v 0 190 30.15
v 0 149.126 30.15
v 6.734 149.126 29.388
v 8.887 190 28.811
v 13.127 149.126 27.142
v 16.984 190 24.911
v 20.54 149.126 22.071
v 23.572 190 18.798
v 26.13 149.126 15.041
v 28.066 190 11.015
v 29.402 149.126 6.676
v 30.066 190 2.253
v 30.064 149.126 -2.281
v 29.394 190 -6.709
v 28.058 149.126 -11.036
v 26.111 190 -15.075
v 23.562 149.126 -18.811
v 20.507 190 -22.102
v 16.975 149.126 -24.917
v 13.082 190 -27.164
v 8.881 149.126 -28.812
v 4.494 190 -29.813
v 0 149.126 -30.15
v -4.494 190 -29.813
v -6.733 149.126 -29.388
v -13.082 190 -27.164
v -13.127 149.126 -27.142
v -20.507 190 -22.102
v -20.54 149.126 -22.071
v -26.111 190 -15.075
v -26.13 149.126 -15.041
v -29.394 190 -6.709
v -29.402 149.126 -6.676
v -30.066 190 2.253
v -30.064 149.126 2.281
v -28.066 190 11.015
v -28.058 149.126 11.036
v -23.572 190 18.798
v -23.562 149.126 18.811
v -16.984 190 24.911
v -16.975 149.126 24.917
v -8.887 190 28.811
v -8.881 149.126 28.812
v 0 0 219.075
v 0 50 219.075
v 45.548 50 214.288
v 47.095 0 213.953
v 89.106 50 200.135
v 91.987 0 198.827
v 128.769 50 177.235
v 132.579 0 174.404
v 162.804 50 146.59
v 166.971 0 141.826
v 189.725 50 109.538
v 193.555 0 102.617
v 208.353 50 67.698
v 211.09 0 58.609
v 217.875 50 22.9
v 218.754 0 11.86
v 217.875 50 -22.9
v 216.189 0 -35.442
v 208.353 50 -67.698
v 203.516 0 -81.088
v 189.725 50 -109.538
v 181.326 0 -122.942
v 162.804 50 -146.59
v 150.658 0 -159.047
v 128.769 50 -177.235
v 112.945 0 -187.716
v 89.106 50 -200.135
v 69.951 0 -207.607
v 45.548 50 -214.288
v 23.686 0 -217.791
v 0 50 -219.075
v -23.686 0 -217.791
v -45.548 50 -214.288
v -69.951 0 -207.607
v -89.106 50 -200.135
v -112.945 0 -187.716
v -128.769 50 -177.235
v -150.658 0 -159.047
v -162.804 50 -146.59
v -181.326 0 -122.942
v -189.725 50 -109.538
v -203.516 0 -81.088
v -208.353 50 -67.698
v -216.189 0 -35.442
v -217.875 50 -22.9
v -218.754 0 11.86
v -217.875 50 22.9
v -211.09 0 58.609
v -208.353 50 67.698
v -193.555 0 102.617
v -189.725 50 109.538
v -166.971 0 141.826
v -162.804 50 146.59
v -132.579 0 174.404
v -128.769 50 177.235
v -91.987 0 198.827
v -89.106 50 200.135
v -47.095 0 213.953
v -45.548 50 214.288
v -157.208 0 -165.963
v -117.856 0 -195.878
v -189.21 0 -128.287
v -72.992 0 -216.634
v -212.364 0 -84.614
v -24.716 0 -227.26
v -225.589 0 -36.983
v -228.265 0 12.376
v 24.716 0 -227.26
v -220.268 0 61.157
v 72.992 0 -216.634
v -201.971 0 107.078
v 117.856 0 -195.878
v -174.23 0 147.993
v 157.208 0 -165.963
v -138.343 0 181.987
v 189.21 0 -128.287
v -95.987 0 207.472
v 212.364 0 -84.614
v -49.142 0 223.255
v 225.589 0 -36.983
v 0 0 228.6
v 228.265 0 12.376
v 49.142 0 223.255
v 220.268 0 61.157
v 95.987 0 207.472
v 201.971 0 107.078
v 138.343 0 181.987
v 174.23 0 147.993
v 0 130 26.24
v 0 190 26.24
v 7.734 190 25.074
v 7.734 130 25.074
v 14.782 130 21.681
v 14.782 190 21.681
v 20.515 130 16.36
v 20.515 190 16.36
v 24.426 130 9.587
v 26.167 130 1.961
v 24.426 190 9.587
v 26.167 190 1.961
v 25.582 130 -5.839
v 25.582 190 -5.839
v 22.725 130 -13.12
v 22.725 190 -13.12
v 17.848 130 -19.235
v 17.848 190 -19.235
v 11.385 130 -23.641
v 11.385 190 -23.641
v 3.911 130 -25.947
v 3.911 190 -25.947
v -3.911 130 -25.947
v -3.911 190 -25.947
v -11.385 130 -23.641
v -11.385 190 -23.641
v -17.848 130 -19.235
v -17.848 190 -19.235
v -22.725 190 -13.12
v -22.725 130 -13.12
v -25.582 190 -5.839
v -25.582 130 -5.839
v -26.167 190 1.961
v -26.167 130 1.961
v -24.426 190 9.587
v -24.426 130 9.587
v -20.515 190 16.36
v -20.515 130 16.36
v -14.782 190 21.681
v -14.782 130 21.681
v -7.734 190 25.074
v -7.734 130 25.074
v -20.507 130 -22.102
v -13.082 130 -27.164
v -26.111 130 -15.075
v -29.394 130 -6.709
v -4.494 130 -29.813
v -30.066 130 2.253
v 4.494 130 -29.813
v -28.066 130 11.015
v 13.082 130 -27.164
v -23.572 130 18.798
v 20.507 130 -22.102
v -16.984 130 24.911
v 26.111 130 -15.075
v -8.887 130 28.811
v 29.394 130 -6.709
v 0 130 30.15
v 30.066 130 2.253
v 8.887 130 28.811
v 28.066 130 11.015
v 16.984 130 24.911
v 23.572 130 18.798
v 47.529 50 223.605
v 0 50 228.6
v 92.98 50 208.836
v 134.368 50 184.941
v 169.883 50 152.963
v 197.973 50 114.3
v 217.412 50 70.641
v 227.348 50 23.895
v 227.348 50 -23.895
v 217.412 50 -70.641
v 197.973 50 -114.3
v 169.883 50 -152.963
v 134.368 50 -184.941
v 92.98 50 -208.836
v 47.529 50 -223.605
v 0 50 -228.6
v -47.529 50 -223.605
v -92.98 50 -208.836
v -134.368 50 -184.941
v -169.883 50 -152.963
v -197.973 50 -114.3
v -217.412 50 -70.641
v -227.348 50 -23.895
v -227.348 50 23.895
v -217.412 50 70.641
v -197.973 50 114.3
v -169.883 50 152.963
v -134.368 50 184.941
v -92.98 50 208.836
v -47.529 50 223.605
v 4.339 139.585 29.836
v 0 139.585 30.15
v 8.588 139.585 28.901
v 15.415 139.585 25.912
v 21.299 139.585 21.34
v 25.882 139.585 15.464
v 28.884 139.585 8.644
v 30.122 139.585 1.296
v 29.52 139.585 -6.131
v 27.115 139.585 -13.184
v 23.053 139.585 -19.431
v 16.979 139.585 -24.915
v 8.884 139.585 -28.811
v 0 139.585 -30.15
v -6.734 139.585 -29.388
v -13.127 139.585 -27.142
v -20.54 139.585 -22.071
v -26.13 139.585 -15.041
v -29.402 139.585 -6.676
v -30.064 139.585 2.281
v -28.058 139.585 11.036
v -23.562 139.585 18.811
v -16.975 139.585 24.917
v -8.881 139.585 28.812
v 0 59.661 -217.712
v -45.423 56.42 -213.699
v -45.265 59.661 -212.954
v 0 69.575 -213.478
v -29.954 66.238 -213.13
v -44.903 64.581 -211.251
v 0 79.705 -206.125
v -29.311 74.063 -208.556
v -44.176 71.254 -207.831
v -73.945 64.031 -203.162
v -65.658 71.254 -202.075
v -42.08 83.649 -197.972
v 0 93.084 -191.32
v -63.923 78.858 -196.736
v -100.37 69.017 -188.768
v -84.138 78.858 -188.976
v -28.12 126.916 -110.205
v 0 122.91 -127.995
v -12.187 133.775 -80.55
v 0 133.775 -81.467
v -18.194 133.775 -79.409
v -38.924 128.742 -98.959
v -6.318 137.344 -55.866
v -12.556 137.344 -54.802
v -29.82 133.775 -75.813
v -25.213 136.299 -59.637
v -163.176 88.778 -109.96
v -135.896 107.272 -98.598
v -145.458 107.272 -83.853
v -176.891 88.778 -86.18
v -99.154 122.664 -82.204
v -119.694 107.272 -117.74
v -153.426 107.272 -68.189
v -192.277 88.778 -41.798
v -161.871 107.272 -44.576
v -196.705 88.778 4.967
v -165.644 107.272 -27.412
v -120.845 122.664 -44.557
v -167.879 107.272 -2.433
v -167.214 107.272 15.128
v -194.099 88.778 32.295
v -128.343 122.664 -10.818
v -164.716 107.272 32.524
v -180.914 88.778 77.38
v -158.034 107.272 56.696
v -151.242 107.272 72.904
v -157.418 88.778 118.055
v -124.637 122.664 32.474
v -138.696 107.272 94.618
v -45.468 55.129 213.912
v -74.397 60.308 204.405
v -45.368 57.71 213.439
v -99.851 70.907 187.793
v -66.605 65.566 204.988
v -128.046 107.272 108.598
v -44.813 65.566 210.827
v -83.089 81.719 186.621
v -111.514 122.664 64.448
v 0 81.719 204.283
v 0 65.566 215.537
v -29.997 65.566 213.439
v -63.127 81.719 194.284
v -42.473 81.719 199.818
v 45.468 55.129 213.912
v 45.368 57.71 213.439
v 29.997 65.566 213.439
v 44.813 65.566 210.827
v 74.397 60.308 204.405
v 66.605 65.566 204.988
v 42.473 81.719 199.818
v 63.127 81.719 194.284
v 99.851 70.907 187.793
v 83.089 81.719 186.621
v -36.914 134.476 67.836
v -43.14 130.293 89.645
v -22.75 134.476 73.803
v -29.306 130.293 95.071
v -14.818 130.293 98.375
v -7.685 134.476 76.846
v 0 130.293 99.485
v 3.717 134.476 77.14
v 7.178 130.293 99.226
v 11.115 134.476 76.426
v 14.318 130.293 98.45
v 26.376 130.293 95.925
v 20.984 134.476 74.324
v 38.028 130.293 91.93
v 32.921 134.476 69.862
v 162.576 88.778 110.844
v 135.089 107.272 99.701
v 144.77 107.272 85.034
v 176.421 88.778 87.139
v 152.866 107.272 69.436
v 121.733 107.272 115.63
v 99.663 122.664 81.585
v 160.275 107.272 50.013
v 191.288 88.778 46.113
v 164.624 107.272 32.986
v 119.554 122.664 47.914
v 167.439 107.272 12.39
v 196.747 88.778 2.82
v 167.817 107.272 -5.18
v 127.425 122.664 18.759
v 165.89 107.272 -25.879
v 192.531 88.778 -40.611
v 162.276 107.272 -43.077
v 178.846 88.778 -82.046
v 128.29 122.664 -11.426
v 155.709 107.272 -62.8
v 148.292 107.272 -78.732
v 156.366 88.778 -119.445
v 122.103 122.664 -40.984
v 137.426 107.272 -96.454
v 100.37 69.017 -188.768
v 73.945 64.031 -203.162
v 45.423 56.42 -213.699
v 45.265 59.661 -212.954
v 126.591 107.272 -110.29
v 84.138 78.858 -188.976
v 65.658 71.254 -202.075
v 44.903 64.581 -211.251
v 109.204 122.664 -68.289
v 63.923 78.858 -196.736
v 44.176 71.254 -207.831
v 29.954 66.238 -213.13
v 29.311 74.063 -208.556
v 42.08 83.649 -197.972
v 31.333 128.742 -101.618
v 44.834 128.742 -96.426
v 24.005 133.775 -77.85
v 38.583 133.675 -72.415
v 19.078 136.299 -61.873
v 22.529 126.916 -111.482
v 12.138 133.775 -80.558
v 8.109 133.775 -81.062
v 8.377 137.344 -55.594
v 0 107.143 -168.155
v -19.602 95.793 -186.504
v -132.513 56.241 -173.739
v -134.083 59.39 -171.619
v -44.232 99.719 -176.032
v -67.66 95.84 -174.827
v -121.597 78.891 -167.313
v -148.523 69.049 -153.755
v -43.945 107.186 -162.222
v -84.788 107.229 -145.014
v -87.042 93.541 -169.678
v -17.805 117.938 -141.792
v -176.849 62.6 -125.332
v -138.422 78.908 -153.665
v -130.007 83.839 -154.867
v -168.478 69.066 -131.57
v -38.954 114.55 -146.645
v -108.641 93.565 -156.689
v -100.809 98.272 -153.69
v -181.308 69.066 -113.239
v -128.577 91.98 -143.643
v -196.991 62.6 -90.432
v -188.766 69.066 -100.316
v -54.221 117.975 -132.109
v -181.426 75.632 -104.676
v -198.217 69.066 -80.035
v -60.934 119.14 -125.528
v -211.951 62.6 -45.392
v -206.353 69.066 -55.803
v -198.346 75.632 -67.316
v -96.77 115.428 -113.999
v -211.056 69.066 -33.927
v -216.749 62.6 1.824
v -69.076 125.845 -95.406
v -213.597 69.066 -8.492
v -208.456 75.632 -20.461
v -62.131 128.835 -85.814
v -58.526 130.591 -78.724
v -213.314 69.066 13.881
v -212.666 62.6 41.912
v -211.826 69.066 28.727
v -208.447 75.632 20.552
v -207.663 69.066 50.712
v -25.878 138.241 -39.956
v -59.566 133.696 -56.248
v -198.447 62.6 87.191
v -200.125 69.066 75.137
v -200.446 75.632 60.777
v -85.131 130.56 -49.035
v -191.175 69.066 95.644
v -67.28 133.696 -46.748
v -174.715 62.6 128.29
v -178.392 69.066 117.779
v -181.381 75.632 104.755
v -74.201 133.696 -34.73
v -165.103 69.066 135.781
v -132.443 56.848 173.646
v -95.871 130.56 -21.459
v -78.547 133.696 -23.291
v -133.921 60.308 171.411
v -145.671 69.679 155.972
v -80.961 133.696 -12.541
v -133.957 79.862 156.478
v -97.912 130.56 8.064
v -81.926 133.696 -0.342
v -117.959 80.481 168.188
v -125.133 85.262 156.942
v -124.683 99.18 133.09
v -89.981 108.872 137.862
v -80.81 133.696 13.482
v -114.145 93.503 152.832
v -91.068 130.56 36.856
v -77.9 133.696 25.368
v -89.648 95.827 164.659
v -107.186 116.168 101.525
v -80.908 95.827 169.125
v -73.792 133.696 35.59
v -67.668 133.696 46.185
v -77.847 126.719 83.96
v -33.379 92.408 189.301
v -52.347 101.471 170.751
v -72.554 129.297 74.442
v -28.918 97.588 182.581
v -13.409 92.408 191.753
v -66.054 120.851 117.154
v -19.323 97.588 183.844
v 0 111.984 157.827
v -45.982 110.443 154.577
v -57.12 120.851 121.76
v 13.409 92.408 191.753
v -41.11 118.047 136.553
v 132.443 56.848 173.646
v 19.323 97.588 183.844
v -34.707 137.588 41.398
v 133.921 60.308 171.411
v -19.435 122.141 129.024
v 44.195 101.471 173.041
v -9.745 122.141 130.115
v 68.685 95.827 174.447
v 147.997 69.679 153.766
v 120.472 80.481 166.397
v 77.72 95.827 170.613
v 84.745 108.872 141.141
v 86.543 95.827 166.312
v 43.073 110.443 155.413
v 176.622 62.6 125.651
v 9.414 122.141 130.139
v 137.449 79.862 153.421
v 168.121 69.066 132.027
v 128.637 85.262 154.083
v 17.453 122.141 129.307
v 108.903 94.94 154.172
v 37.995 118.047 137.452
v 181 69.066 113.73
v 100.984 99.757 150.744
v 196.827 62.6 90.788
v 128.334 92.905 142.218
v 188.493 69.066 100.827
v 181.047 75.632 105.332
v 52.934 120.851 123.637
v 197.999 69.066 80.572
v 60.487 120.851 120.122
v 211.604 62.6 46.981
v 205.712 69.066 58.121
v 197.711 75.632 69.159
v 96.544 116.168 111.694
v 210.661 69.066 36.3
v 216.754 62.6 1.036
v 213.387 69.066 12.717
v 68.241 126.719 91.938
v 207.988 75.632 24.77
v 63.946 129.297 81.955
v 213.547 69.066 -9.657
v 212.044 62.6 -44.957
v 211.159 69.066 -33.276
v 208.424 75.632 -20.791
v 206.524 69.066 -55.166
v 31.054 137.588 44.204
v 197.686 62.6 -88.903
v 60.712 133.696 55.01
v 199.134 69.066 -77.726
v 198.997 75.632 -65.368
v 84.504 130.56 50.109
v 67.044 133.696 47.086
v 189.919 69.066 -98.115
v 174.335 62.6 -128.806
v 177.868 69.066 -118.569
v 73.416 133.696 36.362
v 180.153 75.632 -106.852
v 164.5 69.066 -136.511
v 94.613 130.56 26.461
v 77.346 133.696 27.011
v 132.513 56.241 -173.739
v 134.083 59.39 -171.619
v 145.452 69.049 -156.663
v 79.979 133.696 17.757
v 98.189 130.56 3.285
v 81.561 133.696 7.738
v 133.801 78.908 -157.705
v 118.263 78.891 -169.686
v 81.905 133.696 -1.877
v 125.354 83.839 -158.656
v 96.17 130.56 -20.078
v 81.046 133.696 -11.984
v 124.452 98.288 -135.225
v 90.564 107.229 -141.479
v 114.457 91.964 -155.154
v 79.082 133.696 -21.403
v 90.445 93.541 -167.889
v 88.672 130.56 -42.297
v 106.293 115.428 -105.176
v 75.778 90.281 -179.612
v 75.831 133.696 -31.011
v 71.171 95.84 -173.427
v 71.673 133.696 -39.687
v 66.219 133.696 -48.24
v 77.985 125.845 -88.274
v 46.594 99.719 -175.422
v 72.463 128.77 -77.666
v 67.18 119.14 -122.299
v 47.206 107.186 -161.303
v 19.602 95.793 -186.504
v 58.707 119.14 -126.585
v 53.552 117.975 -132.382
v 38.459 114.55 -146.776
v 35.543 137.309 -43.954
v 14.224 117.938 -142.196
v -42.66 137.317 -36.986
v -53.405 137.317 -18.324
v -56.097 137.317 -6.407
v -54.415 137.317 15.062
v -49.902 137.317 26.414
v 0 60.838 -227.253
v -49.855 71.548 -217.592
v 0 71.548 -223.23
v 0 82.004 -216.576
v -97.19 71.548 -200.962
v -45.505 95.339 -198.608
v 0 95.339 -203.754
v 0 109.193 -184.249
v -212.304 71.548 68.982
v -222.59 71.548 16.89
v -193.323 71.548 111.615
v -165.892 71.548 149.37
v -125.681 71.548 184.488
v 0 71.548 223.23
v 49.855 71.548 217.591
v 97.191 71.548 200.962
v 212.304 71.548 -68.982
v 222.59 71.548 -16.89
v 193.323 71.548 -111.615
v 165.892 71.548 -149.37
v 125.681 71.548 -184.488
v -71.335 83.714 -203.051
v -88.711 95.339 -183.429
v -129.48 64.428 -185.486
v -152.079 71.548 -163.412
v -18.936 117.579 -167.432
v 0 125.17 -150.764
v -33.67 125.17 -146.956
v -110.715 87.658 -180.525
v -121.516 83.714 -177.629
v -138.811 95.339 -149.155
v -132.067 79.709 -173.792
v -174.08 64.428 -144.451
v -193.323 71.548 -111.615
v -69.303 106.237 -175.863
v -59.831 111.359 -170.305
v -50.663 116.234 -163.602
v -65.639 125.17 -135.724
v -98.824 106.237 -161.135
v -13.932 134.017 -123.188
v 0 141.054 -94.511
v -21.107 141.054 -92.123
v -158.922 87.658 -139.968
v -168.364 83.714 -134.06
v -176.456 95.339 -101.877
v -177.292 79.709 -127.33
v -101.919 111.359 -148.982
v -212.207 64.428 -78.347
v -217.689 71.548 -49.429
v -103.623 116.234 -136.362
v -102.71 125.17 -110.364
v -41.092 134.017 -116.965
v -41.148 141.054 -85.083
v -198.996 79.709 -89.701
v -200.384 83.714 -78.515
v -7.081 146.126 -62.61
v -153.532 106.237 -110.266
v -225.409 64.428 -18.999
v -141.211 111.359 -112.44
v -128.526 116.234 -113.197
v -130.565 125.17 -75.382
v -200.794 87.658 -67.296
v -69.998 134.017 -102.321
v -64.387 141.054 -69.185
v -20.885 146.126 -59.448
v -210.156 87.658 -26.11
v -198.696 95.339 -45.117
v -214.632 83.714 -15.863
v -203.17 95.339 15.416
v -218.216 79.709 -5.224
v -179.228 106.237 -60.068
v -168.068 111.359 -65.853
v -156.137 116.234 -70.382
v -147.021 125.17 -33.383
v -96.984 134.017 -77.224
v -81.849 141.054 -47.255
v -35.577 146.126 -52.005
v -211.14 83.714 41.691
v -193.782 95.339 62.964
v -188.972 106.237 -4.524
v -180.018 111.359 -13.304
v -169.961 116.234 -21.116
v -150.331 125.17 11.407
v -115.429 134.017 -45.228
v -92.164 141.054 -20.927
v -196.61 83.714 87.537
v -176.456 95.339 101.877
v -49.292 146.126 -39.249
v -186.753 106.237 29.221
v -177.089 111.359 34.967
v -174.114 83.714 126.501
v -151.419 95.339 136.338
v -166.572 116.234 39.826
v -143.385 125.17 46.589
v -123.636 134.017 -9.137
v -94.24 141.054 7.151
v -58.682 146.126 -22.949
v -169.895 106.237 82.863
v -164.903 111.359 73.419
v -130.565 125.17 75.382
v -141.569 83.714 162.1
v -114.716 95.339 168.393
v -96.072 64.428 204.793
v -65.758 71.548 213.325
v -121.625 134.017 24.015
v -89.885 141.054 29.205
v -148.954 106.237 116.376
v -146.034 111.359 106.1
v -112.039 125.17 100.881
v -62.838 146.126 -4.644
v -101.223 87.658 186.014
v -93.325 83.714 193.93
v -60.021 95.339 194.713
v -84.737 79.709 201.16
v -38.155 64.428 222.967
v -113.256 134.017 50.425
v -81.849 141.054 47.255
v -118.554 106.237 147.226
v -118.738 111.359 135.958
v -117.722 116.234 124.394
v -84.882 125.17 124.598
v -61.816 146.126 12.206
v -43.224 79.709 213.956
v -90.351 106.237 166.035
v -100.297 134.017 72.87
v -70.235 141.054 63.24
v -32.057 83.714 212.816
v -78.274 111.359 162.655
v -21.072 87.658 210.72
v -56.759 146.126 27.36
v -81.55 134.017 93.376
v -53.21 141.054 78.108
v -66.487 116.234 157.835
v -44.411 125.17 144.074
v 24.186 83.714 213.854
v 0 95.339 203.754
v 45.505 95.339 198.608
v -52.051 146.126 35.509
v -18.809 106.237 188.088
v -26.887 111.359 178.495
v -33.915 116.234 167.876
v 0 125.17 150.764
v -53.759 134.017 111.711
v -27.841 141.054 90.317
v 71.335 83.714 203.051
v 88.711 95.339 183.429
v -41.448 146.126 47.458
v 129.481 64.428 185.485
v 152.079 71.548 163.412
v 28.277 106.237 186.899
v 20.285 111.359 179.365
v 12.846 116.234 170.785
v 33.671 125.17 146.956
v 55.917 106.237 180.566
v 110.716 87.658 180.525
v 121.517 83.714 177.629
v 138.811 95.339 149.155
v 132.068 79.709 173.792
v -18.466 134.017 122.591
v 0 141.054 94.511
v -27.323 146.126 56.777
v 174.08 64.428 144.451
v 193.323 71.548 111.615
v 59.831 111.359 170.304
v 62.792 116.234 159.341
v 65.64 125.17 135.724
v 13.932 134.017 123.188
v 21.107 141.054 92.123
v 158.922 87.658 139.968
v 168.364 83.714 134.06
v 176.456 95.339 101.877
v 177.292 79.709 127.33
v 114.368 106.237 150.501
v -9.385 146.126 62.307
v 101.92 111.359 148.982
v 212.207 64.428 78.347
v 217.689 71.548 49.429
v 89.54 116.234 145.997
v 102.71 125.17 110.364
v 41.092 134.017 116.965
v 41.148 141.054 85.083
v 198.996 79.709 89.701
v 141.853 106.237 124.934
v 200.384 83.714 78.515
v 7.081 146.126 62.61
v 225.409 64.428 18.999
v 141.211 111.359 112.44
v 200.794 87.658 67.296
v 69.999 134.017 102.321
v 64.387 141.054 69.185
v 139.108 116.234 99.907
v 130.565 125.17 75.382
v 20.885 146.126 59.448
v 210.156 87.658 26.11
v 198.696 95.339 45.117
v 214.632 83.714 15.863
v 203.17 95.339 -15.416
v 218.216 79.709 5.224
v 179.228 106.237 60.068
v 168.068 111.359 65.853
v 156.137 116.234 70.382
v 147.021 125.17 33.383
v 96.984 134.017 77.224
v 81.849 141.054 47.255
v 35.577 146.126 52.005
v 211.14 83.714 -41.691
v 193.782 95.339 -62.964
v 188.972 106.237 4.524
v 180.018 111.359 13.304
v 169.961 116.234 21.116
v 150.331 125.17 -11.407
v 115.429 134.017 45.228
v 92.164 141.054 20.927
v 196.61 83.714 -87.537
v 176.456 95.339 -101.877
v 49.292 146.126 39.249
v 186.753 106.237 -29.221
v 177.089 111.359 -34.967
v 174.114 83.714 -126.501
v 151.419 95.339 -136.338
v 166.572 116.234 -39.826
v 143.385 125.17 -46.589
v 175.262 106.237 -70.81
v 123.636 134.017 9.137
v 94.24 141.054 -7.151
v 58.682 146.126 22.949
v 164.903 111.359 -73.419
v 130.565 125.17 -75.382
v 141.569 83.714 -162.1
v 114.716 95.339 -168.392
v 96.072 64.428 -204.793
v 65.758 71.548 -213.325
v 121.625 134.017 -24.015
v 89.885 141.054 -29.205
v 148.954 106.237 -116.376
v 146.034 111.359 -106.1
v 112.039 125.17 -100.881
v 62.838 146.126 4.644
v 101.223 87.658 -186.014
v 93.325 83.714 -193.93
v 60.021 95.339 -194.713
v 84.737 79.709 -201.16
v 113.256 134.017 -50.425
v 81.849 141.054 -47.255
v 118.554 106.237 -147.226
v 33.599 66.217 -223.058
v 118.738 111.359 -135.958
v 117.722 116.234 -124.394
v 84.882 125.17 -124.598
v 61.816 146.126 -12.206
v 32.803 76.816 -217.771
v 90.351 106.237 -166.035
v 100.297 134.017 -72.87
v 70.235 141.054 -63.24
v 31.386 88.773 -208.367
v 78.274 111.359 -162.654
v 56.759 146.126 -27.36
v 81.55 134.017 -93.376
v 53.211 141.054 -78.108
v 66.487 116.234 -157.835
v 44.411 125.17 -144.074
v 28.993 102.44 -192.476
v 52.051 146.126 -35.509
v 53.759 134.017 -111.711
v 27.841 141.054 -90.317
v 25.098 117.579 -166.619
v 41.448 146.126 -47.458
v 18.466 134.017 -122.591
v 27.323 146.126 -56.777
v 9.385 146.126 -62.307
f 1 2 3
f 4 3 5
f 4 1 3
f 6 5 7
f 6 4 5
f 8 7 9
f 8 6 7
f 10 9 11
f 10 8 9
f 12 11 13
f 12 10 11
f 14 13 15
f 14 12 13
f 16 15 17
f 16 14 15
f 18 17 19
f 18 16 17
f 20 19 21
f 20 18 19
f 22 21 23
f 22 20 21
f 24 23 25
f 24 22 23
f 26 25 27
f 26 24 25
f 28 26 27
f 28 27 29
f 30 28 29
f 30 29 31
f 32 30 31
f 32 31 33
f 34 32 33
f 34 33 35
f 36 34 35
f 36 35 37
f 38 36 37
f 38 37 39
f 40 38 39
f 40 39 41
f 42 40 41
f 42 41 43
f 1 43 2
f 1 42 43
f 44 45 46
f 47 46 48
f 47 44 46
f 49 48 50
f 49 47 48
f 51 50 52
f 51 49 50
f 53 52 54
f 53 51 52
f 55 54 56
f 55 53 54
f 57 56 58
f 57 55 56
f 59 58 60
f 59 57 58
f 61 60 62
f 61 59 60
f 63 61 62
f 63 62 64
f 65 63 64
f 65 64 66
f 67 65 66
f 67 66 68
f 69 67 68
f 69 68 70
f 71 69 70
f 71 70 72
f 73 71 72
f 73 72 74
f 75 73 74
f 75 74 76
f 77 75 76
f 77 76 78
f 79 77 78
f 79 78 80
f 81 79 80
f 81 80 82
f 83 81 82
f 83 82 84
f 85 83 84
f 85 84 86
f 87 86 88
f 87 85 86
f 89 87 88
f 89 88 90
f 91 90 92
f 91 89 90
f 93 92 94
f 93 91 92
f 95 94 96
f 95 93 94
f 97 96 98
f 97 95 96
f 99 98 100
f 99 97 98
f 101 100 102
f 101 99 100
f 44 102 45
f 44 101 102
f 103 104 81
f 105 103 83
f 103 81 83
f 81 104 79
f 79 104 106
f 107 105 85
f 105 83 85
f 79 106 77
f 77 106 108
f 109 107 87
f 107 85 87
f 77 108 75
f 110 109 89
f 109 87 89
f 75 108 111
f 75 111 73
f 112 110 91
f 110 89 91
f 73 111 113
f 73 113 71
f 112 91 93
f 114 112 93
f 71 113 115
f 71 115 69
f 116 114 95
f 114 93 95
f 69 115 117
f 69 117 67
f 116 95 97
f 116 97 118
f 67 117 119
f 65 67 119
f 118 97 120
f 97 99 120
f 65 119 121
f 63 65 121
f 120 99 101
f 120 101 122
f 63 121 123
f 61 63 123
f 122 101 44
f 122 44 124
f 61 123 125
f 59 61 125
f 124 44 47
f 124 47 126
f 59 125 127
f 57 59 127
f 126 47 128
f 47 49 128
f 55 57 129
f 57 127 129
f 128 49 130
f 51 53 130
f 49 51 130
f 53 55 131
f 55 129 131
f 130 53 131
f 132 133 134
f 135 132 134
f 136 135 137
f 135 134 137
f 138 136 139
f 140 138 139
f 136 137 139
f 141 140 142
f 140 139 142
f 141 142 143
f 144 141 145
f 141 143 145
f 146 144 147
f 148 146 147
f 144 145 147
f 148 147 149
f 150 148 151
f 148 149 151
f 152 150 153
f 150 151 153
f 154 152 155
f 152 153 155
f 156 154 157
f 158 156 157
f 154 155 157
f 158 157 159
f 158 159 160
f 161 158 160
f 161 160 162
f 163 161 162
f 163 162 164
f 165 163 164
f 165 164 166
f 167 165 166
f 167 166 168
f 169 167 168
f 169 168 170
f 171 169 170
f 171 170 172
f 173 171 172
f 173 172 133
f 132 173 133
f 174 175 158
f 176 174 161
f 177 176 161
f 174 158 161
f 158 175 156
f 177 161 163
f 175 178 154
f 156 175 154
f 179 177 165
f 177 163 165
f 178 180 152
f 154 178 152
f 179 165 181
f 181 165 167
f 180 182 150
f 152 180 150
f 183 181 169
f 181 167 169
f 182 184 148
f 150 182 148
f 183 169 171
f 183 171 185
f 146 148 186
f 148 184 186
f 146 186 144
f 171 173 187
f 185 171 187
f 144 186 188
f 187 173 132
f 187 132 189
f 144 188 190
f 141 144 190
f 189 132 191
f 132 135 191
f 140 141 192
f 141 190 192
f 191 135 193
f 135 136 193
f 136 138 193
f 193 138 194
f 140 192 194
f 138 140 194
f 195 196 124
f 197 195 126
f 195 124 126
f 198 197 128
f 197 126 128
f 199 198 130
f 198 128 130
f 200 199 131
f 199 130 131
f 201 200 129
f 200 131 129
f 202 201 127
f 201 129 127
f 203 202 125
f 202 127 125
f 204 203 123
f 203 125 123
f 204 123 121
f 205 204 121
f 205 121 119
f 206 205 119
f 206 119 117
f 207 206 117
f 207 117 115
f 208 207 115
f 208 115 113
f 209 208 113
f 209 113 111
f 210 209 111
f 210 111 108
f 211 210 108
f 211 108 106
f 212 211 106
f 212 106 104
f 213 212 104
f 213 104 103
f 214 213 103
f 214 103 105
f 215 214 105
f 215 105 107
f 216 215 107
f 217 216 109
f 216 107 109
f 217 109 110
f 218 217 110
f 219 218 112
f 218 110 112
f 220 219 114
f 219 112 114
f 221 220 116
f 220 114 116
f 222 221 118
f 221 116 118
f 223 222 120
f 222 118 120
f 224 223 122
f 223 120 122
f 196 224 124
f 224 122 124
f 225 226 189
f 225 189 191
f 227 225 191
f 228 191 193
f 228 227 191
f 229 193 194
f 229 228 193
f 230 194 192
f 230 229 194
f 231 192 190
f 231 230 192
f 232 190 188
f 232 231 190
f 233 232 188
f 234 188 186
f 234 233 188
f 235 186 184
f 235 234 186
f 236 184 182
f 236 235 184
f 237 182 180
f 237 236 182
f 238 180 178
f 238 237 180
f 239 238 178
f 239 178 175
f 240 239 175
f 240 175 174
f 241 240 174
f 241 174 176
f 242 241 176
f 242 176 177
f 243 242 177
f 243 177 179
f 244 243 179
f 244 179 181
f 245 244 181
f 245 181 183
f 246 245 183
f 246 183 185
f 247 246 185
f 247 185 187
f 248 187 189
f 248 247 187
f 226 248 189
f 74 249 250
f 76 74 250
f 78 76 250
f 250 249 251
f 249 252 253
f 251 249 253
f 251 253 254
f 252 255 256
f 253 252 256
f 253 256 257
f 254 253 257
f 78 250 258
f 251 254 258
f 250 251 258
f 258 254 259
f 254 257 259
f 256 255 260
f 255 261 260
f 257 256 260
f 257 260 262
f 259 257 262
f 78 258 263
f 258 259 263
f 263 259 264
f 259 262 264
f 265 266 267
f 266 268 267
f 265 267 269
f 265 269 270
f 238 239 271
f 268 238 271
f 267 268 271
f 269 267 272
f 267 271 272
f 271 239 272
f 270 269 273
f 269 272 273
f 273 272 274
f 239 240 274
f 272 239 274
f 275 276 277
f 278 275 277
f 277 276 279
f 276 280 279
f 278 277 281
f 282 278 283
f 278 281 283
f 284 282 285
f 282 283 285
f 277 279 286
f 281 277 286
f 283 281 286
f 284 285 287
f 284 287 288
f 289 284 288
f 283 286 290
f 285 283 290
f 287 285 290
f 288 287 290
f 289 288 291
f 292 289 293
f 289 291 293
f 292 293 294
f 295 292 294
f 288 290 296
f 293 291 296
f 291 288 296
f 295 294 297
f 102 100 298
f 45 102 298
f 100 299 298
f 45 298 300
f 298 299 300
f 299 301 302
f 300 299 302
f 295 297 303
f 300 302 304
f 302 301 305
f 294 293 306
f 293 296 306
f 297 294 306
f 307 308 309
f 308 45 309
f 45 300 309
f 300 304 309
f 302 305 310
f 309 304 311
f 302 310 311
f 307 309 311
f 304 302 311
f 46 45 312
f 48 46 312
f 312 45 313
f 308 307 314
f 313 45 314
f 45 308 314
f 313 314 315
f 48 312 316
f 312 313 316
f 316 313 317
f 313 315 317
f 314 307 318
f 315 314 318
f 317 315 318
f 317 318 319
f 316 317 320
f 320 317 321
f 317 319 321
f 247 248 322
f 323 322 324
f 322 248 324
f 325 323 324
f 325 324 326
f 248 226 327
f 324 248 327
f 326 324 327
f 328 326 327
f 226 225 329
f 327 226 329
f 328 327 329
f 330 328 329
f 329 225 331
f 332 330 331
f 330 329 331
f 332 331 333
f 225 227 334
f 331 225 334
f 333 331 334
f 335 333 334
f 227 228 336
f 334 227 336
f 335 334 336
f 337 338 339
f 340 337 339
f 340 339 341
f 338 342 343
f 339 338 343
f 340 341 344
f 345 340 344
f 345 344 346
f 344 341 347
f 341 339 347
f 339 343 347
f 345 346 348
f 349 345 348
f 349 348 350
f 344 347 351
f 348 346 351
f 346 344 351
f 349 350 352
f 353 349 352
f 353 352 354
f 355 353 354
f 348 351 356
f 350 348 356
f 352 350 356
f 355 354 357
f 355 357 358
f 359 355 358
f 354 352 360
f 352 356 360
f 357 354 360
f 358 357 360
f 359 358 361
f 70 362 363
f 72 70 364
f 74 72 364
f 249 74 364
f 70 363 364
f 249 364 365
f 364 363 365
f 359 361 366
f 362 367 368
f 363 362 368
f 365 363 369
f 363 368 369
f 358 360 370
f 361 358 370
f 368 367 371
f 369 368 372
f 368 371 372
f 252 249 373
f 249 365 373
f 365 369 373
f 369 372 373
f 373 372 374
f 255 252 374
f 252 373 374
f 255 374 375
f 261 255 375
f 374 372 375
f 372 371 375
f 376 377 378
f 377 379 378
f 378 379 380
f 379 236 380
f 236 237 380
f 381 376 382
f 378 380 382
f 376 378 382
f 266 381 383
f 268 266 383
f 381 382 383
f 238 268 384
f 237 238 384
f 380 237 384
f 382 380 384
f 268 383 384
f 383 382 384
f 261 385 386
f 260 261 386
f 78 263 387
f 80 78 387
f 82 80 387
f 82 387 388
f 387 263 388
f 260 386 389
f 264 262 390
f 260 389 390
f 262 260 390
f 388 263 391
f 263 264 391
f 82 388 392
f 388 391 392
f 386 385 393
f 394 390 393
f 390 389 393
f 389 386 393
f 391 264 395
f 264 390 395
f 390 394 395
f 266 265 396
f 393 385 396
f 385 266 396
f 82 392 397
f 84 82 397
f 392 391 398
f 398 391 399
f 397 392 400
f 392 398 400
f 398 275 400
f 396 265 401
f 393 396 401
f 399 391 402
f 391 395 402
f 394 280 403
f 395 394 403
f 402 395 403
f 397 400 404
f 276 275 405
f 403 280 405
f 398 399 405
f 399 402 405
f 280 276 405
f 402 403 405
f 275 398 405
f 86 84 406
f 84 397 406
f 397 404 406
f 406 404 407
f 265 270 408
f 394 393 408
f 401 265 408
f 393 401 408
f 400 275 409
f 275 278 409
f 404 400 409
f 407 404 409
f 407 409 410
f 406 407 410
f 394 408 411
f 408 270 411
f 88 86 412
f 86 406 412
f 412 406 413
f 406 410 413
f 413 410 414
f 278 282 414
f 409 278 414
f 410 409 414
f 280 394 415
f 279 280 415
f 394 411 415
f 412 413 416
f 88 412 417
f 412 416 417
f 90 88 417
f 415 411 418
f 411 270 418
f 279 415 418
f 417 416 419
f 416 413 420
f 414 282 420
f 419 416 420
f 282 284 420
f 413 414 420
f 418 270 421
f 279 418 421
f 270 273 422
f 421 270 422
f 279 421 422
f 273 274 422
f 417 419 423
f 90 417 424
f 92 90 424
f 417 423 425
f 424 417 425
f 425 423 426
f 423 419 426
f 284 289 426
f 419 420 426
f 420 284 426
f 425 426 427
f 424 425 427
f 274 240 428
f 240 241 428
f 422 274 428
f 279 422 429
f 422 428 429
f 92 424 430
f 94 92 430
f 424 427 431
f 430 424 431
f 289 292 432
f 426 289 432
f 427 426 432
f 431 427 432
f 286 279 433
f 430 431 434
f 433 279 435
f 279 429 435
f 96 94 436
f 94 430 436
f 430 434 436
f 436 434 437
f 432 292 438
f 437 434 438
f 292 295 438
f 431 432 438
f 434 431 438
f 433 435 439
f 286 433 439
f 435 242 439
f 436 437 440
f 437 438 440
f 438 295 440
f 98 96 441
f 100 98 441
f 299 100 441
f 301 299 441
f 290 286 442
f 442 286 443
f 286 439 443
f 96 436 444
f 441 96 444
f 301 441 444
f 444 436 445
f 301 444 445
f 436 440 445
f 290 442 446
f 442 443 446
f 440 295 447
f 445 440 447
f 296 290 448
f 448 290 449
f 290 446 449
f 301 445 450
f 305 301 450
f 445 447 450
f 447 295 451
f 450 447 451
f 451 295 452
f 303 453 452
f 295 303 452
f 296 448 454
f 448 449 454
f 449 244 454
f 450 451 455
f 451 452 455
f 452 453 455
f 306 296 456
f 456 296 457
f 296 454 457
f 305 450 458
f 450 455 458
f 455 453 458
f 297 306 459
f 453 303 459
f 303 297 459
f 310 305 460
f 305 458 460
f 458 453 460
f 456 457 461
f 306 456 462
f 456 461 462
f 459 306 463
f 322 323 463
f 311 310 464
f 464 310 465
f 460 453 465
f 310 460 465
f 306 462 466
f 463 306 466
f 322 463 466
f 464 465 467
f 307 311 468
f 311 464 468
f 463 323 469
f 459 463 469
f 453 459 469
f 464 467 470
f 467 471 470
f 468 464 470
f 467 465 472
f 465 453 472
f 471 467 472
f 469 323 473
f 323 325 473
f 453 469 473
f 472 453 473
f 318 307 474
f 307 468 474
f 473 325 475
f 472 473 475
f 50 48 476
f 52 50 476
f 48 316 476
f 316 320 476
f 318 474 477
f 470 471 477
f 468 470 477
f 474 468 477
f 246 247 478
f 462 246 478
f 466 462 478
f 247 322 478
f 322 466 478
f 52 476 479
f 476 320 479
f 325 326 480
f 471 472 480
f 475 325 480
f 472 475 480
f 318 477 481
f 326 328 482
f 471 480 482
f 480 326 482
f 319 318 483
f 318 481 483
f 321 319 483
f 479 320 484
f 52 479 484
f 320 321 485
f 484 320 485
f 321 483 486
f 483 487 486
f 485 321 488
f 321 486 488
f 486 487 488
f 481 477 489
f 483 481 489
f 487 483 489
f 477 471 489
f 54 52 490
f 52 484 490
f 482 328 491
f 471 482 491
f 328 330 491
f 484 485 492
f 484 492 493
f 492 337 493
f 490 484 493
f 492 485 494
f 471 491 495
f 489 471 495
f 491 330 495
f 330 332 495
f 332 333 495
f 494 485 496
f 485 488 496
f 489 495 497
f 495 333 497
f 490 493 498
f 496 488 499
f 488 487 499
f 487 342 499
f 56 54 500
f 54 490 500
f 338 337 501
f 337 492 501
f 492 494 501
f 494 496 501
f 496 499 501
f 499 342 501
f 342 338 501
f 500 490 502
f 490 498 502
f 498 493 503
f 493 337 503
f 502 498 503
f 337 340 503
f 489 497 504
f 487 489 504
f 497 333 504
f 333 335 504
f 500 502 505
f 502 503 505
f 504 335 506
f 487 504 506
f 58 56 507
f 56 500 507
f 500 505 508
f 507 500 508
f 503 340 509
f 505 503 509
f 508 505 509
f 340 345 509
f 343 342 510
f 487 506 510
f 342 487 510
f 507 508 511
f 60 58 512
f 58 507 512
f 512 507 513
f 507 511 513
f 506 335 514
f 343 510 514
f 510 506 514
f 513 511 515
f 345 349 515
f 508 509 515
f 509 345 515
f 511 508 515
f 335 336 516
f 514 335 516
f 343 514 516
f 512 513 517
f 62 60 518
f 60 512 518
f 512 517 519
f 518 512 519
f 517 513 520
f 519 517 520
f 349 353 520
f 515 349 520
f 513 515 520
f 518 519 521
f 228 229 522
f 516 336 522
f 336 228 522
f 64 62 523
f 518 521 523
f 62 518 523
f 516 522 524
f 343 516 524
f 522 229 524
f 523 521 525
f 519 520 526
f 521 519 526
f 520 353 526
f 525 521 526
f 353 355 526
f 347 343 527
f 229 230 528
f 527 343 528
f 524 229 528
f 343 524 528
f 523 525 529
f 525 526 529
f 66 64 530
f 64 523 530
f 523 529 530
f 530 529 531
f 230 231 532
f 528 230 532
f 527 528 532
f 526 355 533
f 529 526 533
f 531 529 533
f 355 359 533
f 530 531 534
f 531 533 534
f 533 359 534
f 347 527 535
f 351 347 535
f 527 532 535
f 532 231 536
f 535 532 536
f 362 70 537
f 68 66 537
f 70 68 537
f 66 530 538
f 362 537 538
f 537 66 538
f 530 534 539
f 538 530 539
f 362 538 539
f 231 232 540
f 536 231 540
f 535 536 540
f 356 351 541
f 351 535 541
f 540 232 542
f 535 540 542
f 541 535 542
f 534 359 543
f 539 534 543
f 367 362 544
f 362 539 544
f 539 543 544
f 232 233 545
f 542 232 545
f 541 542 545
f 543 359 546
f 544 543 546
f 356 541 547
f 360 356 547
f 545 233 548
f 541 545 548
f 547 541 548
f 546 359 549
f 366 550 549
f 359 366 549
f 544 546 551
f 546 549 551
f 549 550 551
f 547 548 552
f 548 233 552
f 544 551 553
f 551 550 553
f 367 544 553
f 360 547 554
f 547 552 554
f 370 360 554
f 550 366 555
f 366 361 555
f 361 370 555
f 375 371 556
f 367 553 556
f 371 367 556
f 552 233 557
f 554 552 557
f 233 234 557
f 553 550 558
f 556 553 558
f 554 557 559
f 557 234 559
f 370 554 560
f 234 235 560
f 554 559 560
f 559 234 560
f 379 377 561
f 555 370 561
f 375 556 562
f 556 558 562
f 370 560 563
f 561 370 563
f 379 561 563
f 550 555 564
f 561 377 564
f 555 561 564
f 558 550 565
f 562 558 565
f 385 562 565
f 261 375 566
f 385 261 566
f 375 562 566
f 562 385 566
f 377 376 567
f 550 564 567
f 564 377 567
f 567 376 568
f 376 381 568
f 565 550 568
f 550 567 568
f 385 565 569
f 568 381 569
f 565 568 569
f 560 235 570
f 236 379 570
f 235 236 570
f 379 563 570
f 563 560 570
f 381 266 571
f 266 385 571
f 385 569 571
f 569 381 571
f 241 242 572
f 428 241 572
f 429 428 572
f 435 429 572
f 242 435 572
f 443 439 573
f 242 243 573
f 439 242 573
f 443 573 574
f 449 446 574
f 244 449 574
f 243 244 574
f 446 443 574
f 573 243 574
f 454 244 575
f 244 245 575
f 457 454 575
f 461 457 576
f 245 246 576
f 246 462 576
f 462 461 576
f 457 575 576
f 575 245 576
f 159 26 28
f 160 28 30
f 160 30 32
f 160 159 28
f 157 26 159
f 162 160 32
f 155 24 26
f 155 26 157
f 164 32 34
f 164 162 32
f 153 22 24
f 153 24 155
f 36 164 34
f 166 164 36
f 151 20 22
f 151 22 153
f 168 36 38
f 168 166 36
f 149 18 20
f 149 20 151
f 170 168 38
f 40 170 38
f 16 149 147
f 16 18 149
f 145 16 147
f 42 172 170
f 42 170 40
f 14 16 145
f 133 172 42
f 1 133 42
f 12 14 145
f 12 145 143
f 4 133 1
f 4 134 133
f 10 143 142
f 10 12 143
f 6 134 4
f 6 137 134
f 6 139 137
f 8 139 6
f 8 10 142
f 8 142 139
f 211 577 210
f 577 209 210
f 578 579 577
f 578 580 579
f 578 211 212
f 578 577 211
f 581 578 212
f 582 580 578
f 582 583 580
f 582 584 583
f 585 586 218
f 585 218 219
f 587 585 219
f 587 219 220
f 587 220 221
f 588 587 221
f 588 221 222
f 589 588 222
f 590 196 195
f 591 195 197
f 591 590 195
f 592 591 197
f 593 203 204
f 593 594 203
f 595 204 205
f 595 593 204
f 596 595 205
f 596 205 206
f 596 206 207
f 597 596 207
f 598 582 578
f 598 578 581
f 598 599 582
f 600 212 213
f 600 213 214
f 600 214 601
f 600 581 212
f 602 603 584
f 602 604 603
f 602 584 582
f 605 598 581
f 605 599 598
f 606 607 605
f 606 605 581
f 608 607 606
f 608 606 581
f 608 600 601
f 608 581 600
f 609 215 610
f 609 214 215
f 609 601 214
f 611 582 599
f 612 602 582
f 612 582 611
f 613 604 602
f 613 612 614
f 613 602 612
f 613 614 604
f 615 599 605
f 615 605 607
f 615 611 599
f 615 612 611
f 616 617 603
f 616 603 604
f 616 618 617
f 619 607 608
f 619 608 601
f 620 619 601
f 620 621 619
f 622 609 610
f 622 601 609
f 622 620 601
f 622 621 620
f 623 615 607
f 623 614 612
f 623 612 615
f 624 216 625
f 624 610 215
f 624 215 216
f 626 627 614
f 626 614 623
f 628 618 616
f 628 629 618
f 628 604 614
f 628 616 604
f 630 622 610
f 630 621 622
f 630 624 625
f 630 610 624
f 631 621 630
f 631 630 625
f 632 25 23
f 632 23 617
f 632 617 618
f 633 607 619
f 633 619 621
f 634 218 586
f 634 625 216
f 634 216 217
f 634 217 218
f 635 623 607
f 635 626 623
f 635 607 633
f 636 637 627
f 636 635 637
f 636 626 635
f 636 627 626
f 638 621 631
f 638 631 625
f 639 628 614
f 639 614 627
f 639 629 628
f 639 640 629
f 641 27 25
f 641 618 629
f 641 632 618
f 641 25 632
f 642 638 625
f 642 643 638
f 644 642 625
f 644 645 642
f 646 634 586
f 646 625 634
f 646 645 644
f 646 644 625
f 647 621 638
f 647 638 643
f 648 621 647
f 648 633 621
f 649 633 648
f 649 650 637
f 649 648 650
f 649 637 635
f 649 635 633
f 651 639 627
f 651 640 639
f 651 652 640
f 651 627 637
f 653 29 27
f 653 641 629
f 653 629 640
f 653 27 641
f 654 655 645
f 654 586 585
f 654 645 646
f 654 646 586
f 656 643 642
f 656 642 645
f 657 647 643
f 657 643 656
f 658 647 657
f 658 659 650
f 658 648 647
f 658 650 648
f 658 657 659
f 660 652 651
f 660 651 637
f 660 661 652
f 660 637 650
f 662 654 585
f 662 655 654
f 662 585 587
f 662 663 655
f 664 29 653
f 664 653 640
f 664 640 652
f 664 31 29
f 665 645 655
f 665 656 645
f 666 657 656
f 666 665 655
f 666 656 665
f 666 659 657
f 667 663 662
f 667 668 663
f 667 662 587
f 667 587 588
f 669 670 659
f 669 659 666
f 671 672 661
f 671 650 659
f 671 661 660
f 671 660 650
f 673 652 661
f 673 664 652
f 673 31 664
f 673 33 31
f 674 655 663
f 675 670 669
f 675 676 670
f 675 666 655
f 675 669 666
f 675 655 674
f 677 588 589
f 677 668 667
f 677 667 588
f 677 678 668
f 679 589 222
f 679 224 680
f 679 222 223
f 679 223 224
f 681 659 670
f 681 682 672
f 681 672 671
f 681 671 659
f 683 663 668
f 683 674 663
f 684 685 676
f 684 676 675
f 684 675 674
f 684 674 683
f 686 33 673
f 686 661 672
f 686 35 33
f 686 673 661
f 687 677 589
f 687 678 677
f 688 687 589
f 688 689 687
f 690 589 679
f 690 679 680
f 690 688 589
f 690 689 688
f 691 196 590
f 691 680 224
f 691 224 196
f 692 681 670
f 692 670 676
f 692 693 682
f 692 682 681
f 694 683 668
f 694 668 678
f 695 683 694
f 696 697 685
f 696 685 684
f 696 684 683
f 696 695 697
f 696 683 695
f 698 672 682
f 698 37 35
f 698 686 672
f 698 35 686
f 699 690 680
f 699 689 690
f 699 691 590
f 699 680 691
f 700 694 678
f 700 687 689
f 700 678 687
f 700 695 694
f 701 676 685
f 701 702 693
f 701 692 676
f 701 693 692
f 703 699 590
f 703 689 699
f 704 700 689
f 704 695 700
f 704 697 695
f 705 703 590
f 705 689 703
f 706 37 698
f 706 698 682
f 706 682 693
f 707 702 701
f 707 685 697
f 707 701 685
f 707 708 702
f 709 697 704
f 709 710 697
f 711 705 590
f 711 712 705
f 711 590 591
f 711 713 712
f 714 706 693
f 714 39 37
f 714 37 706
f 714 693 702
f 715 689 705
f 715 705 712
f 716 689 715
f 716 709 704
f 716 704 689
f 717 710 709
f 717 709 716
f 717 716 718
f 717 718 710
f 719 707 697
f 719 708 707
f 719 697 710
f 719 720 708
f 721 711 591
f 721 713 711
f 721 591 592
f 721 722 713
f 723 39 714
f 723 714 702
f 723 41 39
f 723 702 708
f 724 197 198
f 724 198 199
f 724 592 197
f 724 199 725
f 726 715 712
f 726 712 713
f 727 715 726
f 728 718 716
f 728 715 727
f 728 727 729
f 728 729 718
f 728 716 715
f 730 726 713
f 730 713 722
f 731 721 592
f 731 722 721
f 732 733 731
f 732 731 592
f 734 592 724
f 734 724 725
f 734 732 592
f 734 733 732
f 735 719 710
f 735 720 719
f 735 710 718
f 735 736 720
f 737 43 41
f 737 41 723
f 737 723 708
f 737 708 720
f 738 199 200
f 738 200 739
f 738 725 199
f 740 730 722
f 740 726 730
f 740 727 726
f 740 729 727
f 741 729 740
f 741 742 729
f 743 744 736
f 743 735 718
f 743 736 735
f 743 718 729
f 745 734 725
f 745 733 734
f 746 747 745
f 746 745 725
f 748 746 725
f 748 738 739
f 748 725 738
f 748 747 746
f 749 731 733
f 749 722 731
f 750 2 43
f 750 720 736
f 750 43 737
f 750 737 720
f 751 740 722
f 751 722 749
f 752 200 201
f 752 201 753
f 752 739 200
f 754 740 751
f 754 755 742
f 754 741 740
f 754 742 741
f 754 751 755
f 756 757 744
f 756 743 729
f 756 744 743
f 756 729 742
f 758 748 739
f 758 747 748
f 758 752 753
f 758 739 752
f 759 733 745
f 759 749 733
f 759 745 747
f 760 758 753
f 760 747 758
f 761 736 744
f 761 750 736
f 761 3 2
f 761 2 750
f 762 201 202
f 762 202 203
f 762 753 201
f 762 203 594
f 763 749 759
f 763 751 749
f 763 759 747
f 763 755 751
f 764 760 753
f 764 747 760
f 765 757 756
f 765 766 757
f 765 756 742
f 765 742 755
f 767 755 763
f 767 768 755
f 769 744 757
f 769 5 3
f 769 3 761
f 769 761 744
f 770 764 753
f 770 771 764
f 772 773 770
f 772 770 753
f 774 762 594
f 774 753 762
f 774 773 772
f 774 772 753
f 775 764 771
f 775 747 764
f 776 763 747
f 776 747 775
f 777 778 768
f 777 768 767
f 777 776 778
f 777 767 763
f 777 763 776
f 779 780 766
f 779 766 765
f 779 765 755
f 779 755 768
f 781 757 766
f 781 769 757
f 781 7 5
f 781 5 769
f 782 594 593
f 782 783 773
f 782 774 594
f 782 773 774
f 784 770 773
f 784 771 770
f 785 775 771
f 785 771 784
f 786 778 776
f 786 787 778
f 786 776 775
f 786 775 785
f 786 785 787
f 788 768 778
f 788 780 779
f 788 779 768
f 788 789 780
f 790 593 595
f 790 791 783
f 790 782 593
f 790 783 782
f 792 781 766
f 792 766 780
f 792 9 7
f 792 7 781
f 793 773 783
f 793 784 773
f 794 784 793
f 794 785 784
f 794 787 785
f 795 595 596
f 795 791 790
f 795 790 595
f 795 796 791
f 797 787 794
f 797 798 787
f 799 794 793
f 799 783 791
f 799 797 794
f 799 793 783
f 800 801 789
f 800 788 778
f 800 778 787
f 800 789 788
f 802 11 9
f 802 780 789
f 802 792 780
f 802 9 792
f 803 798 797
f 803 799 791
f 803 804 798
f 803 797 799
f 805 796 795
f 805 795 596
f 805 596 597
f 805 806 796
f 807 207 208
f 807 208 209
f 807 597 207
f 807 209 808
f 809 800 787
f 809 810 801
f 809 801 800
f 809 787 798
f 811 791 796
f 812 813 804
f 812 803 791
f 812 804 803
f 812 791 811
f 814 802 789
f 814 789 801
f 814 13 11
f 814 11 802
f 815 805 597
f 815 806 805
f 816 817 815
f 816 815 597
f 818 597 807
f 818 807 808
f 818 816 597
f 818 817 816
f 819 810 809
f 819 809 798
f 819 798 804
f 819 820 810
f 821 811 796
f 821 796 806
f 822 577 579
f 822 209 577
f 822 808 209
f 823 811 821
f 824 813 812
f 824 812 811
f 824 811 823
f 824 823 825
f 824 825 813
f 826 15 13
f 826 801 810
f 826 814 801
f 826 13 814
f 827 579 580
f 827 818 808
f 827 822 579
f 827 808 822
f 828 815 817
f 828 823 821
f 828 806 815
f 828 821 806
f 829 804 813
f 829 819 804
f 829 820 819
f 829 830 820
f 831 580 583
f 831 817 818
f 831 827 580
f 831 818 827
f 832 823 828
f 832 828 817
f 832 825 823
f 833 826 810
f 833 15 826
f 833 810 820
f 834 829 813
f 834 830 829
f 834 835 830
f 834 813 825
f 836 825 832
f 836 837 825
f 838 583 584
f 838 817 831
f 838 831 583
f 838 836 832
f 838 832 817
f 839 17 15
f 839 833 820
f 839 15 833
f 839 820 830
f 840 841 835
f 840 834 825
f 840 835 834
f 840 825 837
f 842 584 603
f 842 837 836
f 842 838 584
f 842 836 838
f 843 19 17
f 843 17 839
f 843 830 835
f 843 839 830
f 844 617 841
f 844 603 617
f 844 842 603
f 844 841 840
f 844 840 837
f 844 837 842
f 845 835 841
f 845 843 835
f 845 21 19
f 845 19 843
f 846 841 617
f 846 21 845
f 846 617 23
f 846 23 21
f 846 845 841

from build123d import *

# Parameters (mm, degrees)
CROQUIS1_R              = 228.6
SALIENTE_EXTRUIR1_DEPTH = 50
C_PULA1_FACE_RADIUS     = 228.6
C_PULA1_HEIGHT          = 100
VACIADO1_T              = -9.525
CROQUIS3_R              = 30.15
SALIENTE_EXTRUIR2_DEPTH = 60
CORTAR_EXTRUIR1_REACH   = 376.988
CROQUIS4_R              = 26.24


with BuildPart() as part:
    # Croquis1 → Saliente-Extruir1 (new body)
    with BuildSketch(Plane(origin=(0, 0, 0), x_dir=(1, 0, 0), z_dir=(0, 1, 0))):
        Circle(CROQUIS1_R)
    extrude(amount=SALIENTE_EXTRUIR1_DEPTH)

    # Cúpula1: an elliptical dome of height H over a round flat face of radius A is half a spheroid: the quarter ellipse of half axes A and H revolved about the face's axis
    with BuildSketch(Plane((0, 50, 0), x_dir=(0, 0, -1), z_dir=(1, 0, 0)), mode=Mode.PRIVATE) as c_pula1_quarter:
        Ellipse(C_PULA1_FACE_RADIUS, C_PULA1_HEIGHT)
        Rectangle(C_PULA1_FACE_RADIUS, C_PULA1_HEIGHT, align=(Align.MIN, Align.MIN), mode=Mode.INTERSECT)
    revolve(c_pula1_quarter.sketch, axis=Axis((0, 50, 0), (0, 1, 0)))

    # Vaciado1
    vaciado1_openings = [part.faces().sort_by_distance(p)[0] for p in [
        (0, 0, 0),
    ]]
    offset(amount=VACIADO1_T, openings=vaciado1_openings, kind=Kind.INTERSECTION)

    # Croquis3 → Saliente-Extruir2 (add)
    with BuildSketch(Plane(origin=(0, 190, 0), x_dir=(1, 0, 0), z_dir=(0, 1, 0))):
        Circle(CROQUIS3_R)
    extrude(amount=-SALIENTE_EXTRUIR2_DEPTH)

    # Croquis4 → Cortar-Extruir1 (cut, up to next)
    with BuildSketch(Plane(origin=(0, 190, 0), x_dir=(1, 0, 0), z_dir=(0, 1, 0)), mode=Mode.PRIVATE) as cortar_extruir1_sk1:
        Circle(CROQUIS4_R)
    cortar_extruir1_tool1 = extrude(cortar_extruir1_sk1.sketch, amount=-CORTAR_EXTRUIR1_REACH, mode=Mode.PRIVATE) & part.part
    add(cortar_extruir1_tool1.solids().sort_by_distance((0, 190, 0))[0], mode=Mode.SUBTRACT)


solid = part.part
